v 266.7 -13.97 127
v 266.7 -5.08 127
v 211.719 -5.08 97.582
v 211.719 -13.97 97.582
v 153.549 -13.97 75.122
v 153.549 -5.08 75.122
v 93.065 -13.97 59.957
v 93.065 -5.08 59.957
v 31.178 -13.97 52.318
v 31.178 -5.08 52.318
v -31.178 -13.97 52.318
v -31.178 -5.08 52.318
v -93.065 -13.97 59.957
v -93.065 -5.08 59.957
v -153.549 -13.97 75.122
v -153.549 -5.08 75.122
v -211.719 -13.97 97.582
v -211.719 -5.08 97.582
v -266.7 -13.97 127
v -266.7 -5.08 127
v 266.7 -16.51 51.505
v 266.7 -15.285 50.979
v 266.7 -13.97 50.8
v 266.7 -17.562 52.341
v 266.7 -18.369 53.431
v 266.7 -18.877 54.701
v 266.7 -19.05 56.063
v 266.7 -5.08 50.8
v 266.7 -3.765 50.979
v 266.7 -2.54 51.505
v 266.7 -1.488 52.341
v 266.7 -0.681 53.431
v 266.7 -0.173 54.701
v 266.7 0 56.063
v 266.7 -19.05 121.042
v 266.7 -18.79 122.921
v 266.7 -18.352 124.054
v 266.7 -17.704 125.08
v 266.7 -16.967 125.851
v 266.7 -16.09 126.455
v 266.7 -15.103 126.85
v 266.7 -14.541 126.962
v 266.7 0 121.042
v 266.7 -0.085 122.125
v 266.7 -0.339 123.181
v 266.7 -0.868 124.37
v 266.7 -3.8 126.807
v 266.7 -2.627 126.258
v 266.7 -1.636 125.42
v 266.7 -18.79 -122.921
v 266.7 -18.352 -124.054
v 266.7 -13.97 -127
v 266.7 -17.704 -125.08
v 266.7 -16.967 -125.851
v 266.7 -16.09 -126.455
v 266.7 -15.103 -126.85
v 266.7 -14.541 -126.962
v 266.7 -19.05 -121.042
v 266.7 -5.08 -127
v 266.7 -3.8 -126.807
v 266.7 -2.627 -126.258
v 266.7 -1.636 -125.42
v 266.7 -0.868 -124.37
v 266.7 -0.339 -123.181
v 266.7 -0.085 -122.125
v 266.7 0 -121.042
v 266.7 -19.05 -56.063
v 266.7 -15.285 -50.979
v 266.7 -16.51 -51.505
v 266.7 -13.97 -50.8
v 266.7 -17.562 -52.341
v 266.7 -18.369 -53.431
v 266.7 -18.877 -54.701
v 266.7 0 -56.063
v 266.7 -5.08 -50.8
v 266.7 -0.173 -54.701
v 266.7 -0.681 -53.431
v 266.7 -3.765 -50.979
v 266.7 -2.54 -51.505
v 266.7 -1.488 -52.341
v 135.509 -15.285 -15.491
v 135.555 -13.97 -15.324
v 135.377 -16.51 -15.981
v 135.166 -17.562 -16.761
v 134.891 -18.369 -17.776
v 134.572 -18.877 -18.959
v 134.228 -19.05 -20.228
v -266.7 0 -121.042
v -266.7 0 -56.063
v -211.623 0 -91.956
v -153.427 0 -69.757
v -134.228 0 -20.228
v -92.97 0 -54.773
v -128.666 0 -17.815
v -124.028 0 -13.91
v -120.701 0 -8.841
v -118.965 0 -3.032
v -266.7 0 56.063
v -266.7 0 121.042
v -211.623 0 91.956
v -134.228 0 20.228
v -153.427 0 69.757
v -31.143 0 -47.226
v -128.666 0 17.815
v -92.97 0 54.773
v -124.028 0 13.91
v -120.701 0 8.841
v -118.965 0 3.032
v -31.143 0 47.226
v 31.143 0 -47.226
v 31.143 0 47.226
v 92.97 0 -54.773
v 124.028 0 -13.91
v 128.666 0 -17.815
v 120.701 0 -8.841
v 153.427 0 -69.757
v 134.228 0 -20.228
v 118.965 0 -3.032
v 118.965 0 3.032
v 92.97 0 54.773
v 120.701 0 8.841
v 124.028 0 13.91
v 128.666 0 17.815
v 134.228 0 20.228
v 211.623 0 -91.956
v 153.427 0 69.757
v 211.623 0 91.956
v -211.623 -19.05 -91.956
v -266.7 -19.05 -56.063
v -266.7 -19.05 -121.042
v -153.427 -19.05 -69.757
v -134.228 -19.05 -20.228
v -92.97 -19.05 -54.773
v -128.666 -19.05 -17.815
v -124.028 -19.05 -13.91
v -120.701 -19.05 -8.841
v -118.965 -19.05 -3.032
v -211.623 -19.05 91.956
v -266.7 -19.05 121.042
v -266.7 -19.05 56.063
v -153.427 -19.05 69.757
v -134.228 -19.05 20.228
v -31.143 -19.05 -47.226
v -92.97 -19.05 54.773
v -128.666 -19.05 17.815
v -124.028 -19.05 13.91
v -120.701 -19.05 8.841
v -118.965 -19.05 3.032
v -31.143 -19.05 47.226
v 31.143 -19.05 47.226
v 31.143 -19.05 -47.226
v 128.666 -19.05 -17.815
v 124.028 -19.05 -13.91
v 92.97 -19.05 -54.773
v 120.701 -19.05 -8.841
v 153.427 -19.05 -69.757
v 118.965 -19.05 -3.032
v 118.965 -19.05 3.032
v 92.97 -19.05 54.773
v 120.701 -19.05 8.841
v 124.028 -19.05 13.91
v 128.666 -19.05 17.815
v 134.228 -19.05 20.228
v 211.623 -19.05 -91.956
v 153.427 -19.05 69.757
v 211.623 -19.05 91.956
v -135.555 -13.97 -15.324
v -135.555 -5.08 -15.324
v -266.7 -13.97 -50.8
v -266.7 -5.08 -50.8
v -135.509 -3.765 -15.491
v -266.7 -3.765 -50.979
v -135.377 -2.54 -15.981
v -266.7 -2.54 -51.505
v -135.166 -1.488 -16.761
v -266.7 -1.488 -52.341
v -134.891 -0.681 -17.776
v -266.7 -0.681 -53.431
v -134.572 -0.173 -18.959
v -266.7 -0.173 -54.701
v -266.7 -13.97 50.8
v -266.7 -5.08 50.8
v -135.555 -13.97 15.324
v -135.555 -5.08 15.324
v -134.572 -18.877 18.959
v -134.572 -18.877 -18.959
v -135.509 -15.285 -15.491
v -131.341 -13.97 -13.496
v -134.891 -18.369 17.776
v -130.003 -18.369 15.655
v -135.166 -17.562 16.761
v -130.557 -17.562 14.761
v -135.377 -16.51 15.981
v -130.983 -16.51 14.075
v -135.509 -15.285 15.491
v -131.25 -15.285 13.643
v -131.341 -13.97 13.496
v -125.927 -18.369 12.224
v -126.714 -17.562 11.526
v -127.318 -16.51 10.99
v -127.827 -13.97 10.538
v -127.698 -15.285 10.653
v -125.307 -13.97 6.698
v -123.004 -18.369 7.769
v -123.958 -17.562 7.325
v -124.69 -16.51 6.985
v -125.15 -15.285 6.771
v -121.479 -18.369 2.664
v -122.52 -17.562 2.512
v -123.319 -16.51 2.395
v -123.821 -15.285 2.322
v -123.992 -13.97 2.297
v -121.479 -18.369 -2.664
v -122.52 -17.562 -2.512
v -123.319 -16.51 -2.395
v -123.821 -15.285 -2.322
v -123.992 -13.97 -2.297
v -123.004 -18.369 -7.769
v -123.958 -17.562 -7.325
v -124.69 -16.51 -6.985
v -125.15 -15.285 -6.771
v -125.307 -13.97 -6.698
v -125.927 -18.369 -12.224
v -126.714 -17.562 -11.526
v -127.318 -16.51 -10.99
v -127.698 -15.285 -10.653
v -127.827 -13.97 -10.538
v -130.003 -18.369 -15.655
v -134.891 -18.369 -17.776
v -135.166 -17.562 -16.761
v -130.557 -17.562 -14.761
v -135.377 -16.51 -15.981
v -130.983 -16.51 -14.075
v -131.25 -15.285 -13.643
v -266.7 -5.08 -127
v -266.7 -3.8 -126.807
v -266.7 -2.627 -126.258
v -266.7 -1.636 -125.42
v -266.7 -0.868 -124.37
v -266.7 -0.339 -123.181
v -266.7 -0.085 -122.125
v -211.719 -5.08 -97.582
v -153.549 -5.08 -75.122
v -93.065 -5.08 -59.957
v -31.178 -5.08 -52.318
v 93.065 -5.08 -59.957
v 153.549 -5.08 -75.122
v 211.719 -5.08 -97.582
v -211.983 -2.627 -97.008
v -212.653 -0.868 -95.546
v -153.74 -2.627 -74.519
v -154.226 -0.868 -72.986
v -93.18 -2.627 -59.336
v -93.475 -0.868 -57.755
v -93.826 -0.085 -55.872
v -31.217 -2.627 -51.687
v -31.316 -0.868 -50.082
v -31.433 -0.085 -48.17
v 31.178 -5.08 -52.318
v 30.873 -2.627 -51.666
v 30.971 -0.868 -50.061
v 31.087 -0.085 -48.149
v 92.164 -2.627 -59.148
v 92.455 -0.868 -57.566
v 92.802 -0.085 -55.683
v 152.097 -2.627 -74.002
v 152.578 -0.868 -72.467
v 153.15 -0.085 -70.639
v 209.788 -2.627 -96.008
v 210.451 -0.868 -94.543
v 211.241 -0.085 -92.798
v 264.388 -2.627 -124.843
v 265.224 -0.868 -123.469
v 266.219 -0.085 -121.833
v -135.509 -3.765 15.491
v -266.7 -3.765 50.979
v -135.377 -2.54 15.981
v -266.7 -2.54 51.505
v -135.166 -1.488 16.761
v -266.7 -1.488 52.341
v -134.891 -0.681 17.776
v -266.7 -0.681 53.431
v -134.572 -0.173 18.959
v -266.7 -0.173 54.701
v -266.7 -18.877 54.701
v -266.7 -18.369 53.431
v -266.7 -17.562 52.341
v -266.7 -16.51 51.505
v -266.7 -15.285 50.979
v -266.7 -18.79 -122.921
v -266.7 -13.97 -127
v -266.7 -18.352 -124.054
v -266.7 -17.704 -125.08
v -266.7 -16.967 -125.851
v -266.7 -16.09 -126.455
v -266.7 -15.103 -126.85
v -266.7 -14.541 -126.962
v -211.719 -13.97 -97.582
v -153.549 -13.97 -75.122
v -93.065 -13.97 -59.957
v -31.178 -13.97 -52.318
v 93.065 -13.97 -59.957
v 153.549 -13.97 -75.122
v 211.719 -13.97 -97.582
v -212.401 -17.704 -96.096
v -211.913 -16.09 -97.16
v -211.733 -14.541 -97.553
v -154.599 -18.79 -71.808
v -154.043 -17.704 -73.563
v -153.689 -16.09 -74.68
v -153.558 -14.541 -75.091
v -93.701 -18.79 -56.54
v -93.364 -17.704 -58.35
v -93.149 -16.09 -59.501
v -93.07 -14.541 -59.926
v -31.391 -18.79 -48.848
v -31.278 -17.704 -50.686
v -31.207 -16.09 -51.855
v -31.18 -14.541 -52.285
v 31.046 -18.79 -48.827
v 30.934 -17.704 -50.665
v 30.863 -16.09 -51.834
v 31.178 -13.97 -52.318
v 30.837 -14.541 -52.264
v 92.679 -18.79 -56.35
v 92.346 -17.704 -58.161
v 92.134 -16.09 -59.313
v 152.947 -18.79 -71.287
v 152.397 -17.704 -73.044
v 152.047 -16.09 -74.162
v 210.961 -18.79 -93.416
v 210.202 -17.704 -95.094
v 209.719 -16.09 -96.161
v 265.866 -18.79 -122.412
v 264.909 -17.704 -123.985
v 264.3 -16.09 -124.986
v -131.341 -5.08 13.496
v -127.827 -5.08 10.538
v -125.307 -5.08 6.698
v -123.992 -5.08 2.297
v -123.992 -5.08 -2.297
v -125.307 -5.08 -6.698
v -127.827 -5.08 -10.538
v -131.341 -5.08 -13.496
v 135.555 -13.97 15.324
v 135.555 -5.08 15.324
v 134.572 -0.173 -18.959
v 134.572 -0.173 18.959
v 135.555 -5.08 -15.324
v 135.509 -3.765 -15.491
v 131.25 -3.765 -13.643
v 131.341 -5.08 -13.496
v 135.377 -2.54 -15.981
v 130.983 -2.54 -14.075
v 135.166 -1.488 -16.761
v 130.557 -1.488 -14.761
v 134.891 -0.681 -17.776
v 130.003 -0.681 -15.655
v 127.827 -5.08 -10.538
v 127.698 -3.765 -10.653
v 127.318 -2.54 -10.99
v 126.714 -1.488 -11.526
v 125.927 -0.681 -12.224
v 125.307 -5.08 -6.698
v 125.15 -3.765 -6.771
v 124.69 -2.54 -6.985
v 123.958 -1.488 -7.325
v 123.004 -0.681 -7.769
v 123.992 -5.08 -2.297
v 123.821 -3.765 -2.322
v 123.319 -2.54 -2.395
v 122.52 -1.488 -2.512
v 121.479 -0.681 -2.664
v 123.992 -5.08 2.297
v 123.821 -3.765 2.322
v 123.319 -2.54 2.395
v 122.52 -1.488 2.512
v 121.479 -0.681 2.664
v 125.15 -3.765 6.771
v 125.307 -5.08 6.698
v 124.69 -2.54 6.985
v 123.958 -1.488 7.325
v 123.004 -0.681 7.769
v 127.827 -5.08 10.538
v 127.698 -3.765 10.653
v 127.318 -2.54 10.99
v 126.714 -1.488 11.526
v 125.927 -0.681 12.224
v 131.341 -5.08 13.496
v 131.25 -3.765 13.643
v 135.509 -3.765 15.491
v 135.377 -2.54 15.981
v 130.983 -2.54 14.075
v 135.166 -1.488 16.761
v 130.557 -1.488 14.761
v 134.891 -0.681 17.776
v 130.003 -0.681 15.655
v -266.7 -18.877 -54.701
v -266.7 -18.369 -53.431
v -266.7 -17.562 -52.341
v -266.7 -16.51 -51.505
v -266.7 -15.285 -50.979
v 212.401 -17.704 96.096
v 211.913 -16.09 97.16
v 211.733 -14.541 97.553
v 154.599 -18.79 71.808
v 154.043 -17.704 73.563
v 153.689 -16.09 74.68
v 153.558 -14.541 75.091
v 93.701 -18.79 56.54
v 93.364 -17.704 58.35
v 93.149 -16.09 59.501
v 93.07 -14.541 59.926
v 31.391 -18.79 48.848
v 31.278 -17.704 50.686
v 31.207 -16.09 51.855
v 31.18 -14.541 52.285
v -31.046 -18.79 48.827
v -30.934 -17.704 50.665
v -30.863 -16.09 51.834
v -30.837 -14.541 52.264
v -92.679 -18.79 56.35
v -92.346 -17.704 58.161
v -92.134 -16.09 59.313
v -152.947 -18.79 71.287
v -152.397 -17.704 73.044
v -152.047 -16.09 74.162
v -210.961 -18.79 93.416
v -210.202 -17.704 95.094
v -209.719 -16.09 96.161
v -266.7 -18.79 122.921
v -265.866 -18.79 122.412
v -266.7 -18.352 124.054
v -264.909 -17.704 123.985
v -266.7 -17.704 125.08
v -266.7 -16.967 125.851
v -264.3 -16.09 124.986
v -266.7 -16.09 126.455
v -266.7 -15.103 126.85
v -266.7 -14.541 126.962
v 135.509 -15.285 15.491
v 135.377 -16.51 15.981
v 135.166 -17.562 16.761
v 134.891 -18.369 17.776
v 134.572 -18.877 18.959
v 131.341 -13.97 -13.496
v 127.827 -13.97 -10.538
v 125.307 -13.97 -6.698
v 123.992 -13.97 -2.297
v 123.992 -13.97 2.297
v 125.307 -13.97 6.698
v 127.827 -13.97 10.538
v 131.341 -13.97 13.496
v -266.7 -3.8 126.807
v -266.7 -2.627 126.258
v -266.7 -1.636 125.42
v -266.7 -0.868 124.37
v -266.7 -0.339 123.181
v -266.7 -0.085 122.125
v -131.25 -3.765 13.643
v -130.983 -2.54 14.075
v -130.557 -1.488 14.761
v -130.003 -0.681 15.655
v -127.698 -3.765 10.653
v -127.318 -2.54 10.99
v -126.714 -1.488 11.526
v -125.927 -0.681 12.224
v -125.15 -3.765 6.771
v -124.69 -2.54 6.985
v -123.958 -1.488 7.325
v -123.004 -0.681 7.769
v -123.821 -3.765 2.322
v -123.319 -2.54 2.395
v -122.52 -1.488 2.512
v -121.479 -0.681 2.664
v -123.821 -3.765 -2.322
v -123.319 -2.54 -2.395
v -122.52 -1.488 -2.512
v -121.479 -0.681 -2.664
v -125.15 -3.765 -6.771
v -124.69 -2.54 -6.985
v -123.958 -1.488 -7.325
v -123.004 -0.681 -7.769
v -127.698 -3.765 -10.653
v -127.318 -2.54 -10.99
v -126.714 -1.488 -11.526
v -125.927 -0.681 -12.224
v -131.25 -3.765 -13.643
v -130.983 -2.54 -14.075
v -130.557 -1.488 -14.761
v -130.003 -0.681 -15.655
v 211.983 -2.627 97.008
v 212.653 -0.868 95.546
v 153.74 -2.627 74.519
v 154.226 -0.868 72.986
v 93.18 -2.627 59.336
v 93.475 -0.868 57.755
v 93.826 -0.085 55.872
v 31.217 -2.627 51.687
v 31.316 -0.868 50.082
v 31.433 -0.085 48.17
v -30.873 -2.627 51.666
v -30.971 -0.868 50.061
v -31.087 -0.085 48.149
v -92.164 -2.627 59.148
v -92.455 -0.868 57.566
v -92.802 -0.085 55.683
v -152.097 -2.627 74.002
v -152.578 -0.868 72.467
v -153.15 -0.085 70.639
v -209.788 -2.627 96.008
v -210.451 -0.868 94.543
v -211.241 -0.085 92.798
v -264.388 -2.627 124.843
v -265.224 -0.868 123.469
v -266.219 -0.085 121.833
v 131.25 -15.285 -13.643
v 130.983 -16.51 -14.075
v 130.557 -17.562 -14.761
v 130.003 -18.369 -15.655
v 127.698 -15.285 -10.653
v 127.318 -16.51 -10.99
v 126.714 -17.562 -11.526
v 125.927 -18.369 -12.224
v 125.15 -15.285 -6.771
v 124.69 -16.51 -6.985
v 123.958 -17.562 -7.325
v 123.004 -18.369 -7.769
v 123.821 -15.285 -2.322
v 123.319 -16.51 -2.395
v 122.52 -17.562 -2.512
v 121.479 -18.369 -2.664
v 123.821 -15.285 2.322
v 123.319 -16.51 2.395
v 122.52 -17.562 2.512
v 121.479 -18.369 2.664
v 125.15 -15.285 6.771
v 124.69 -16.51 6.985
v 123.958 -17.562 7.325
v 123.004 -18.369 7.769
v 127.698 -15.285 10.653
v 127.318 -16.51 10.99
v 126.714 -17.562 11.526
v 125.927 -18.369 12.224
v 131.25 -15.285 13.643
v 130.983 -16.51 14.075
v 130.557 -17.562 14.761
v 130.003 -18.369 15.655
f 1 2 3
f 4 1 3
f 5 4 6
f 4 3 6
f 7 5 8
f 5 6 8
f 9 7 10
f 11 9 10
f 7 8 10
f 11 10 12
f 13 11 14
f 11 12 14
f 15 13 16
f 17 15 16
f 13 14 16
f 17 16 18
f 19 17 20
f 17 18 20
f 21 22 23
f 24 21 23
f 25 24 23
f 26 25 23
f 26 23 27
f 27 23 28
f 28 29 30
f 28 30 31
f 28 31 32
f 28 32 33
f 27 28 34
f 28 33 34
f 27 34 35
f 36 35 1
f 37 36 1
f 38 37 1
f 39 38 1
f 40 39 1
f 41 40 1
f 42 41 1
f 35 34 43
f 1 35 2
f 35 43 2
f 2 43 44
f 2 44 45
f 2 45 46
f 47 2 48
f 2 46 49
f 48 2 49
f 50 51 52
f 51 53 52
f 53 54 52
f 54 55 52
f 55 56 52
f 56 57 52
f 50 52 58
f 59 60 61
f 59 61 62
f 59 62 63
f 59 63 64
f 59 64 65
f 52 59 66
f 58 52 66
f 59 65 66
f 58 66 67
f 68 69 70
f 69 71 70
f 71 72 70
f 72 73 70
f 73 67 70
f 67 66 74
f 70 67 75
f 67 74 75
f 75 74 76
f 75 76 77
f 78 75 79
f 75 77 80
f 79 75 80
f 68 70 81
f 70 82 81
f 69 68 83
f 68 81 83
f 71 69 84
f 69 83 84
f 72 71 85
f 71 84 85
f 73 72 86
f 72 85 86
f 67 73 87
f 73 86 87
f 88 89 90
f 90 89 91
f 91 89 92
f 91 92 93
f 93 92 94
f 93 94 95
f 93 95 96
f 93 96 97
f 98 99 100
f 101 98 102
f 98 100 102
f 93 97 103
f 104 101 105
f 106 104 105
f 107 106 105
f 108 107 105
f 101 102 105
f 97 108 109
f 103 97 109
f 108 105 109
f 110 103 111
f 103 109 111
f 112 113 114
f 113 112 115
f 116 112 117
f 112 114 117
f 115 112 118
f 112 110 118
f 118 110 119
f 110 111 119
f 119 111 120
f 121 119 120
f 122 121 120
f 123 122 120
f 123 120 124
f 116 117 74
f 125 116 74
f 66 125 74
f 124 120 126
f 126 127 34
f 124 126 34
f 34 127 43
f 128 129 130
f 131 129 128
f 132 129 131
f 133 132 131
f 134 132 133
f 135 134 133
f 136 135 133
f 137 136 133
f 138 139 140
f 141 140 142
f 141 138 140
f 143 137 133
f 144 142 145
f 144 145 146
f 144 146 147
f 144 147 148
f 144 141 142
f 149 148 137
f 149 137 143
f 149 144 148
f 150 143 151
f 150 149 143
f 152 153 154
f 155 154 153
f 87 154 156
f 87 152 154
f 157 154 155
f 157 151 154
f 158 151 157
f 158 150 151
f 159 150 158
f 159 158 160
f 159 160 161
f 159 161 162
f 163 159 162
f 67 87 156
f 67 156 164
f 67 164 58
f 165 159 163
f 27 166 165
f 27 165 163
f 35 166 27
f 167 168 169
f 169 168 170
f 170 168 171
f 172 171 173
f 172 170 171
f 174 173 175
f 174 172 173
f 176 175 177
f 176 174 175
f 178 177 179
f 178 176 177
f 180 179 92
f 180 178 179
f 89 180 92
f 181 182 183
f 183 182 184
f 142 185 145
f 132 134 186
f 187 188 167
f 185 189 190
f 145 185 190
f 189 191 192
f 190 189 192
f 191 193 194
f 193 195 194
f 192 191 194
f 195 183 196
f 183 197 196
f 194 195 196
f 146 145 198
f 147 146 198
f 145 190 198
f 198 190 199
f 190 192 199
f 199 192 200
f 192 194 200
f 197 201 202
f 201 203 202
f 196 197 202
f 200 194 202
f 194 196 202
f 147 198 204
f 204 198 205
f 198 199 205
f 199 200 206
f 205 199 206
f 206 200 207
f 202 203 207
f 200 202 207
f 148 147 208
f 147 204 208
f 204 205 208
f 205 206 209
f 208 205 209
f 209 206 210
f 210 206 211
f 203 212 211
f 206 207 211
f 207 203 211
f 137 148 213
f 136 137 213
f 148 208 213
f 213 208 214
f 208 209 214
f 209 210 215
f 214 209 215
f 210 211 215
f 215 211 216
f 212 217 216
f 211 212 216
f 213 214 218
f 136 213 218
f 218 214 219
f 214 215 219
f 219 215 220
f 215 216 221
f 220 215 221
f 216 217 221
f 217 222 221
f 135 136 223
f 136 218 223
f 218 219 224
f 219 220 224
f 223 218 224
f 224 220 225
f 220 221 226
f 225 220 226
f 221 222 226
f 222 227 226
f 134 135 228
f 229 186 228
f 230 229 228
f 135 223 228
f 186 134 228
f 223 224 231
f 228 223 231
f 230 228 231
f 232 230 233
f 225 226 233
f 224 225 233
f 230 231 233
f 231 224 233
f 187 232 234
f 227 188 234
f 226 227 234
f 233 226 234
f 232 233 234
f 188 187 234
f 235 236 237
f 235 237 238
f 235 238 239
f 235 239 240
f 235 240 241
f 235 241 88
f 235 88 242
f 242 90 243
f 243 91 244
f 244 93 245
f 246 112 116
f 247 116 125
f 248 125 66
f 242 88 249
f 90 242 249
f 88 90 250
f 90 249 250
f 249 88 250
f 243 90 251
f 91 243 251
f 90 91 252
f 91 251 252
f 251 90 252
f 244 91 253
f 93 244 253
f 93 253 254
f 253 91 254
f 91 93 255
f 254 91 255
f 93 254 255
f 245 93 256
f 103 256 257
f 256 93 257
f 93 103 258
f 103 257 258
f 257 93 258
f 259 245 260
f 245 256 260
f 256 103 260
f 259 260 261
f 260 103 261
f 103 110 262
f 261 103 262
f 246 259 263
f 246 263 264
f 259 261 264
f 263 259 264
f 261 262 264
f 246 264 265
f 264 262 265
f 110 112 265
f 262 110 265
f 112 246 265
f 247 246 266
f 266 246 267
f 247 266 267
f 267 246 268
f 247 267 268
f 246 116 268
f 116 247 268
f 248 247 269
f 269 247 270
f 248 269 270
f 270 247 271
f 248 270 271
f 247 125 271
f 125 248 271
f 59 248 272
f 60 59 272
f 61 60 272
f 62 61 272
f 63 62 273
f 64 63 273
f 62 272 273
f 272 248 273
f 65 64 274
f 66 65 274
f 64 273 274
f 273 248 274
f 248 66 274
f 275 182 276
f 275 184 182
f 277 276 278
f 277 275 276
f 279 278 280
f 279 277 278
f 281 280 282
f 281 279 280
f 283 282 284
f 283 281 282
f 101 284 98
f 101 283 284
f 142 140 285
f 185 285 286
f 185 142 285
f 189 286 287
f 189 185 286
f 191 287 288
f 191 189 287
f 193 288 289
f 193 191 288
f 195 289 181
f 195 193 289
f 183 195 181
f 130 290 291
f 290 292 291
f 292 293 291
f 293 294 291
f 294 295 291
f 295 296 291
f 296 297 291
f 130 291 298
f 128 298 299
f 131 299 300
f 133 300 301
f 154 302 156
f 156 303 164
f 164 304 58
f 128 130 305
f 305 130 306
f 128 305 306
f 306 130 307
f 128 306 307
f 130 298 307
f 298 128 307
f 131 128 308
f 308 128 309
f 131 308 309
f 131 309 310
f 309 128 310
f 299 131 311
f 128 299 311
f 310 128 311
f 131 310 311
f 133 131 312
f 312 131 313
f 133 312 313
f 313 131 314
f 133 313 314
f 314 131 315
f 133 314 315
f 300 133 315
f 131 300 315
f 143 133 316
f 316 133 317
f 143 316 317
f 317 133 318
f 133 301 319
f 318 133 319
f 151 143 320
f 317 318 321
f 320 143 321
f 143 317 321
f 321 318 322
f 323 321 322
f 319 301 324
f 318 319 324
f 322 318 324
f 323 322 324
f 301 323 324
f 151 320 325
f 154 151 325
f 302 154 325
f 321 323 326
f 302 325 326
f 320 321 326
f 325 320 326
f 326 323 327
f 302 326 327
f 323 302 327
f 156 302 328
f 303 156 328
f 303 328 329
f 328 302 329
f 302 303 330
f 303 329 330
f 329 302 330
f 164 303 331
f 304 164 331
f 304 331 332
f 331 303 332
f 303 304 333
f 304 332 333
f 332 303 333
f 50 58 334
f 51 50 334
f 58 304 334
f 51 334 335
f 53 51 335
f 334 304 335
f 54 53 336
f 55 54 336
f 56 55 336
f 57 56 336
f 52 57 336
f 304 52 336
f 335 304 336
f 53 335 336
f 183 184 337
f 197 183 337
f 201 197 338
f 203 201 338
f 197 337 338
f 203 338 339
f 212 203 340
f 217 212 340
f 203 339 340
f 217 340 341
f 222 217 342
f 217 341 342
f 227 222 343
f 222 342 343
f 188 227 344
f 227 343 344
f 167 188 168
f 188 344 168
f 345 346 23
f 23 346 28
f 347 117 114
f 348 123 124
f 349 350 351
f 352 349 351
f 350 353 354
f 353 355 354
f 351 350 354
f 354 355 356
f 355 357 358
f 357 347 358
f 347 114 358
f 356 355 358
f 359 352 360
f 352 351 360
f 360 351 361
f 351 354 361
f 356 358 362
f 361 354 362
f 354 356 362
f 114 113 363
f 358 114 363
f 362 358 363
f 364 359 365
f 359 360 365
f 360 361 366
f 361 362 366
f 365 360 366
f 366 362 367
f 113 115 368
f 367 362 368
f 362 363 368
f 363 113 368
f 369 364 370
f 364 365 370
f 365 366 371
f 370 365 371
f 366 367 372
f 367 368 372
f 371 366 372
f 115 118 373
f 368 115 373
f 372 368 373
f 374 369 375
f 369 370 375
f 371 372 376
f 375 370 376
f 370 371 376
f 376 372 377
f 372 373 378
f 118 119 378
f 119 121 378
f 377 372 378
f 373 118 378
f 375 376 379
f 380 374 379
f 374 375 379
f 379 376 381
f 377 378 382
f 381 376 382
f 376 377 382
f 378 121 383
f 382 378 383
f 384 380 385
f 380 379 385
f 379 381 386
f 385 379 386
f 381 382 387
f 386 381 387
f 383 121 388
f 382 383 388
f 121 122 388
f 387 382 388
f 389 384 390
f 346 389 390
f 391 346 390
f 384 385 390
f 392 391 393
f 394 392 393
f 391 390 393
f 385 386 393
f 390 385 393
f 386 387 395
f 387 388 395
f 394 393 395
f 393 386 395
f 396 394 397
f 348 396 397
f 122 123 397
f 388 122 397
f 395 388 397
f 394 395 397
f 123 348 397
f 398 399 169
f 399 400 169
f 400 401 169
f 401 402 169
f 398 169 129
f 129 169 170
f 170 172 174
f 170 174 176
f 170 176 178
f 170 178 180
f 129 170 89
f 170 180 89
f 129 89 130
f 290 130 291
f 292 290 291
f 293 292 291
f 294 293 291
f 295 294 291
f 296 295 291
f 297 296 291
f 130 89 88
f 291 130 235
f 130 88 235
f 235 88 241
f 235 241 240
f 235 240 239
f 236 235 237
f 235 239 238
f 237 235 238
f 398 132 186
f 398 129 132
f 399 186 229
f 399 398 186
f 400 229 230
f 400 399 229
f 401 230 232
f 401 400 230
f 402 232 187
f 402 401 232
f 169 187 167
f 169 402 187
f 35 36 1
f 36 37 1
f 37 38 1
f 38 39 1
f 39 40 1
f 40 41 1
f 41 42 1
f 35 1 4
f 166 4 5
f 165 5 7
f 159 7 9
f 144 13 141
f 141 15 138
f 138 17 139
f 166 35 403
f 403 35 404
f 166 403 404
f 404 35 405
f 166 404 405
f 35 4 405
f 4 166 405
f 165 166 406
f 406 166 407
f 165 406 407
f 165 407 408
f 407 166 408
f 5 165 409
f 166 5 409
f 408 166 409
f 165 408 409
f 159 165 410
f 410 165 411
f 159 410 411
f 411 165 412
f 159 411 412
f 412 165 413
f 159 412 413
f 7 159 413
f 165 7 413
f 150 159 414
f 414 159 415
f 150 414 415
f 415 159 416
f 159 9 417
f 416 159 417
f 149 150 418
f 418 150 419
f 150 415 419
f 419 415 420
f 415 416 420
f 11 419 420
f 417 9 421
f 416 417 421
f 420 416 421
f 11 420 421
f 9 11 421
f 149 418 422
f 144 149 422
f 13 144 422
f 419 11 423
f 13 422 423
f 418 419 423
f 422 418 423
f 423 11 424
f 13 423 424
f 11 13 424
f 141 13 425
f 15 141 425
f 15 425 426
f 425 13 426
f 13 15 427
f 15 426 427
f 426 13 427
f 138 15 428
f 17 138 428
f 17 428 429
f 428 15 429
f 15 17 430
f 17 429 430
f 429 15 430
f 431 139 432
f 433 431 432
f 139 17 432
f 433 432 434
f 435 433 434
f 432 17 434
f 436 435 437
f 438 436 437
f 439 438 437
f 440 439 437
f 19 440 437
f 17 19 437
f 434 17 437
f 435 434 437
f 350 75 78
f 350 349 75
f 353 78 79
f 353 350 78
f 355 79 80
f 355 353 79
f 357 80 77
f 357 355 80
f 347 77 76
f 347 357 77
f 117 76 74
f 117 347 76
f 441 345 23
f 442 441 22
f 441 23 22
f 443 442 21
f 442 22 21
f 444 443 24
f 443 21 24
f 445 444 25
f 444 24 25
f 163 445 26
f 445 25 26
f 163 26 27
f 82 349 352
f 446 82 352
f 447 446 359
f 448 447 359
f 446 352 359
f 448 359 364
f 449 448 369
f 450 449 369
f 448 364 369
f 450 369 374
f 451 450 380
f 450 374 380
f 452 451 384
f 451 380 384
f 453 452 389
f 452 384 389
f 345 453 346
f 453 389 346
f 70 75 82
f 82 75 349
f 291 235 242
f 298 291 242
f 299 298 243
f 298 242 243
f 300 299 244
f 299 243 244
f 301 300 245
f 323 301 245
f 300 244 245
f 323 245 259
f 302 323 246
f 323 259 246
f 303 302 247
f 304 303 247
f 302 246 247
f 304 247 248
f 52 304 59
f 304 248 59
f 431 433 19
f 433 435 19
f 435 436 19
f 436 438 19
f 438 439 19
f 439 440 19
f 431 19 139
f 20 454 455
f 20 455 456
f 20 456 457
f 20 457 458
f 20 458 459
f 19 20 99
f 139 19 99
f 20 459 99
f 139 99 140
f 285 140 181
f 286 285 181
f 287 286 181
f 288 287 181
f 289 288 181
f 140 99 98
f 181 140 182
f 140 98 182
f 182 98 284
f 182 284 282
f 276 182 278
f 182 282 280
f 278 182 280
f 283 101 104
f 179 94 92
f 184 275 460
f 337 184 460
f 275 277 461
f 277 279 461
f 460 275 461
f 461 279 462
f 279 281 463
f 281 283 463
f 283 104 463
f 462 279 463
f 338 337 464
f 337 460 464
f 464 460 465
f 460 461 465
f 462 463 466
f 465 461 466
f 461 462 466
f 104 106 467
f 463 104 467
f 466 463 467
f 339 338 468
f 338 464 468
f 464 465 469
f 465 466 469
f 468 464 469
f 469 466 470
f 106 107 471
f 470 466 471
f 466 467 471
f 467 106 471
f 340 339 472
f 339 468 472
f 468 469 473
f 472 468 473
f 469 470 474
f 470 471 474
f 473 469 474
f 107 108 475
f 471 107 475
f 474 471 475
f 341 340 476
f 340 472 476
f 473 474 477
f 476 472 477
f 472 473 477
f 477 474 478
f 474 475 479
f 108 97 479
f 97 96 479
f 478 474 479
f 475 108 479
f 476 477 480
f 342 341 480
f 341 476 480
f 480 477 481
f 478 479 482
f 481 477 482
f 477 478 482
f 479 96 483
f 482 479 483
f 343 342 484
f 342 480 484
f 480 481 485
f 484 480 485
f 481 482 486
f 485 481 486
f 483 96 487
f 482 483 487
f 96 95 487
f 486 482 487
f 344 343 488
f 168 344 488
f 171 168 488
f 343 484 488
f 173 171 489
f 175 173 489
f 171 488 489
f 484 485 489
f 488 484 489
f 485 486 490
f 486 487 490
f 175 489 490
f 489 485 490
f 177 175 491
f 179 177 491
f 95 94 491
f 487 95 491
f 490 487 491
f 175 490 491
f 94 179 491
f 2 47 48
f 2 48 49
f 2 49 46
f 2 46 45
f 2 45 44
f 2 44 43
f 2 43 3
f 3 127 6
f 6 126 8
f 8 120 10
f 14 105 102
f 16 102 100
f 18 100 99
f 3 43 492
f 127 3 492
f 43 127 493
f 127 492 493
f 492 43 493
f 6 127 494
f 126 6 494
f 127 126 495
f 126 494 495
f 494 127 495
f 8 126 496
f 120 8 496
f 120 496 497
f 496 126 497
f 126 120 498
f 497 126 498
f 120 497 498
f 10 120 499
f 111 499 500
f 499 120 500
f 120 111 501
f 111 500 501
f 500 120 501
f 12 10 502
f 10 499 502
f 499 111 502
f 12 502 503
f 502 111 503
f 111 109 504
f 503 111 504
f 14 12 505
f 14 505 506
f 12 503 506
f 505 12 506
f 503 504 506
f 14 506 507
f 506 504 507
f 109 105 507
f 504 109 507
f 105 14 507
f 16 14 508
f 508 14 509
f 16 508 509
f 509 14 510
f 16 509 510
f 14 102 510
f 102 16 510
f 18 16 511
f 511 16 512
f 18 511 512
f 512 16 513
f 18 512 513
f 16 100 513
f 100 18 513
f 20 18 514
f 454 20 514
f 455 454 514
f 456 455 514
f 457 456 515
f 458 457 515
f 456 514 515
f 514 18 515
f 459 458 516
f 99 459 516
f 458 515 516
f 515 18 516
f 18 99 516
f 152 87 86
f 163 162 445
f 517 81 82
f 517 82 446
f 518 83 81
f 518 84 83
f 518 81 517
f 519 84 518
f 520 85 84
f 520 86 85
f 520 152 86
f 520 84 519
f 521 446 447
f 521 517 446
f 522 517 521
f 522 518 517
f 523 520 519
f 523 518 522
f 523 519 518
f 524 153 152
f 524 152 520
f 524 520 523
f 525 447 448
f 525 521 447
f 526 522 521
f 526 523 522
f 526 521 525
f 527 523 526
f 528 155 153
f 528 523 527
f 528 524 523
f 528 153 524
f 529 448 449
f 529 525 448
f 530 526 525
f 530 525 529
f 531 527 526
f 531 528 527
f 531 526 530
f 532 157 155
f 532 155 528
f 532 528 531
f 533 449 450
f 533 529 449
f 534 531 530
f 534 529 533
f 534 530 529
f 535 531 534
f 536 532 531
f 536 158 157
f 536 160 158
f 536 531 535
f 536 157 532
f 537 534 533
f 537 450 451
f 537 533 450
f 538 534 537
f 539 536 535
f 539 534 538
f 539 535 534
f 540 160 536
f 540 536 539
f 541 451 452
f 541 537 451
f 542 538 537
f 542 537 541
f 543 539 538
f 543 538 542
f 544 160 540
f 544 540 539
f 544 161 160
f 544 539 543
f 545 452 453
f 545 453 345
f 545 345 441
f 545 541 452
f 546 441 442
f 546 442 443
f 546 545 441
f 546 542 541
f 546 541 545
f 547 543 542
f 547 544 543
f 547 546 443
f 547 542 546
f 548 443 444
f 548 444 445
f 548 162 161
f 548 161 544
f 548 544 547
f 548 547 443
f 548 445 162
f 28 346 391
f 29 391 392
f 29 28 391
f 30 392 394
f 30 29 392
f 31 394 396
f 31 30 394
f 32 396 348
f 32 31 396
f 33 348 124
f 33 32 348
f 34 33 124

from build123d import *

# Parameters (mm, degrees)
F1_DEPTH = 19.05
F2_R     = 5.08
F3_R     = 5.08


with BuildPart() as f1:
    # F0 (on Front) → F1 (new body)
    with BuildSketch(Plane.XZ):
        with BuildLine():
            Line((135.5546836256, 15.3242284359), (266.7, 50.8))
            Line((266.7, 50.8), (266.7, 127))
            ThreePointArc((266.7, 127), (0, 51.3599310759), (-266.7, 127))
            Line((-266.7, 127), (-266.7, 50.8))
            Line((-266.7, 50.8), (-135.5546836256, 15.3242284359))
            ThreePointArc((-135.5546836256, 15.3242284359), (-123.825, 0), (-135.5546836256, -15.3242284359))
            Line((-135.5546836256, -15.3242284359), (-266.7, -50.8))
            Line((-266.7, -50.8), (-266.7, -127))
            ThreePointArc((-266.7, -127), (0, -51.3599310759), (266.7, -127))
            Line((266.7, -127), (266.7, -50.8))
            Line((266.7, -50.8), (135.5546836256, -15.3242284359))
            ThreePointArc((135.5546836256, -15.3242284359), (123.825, 0), (135.5546836256, 15.3242284359))
        make_face()
    extrude(amount=F1_DEPTH)

    # F2
    f2_edges = [f1.edges().sort_by_distance(p)[0] for p in [
        (0, 0, 51.359931),
        (201.127342, 0, 33.062114),
        (-201.127342, 0, -33.062114),
        (0, 0, -51.359931),
    ]]
    fillet(f2_edges, radius=F2_R)

    # F3
    f3_edges = [f1.edges().sort_by_distance(p)[0] for p in [
        (0, -19.05, 51.359931),
        (-201.127342, -19.05, 33.062114),
        (0, -19.05, -51.359931),
        (201.127342, -5.08, -33.062114),
        (201.127342, -19.05, 33.062114),
    ]]
    fillet(f3_edges, radius=F3_R)


solid = f1.part
